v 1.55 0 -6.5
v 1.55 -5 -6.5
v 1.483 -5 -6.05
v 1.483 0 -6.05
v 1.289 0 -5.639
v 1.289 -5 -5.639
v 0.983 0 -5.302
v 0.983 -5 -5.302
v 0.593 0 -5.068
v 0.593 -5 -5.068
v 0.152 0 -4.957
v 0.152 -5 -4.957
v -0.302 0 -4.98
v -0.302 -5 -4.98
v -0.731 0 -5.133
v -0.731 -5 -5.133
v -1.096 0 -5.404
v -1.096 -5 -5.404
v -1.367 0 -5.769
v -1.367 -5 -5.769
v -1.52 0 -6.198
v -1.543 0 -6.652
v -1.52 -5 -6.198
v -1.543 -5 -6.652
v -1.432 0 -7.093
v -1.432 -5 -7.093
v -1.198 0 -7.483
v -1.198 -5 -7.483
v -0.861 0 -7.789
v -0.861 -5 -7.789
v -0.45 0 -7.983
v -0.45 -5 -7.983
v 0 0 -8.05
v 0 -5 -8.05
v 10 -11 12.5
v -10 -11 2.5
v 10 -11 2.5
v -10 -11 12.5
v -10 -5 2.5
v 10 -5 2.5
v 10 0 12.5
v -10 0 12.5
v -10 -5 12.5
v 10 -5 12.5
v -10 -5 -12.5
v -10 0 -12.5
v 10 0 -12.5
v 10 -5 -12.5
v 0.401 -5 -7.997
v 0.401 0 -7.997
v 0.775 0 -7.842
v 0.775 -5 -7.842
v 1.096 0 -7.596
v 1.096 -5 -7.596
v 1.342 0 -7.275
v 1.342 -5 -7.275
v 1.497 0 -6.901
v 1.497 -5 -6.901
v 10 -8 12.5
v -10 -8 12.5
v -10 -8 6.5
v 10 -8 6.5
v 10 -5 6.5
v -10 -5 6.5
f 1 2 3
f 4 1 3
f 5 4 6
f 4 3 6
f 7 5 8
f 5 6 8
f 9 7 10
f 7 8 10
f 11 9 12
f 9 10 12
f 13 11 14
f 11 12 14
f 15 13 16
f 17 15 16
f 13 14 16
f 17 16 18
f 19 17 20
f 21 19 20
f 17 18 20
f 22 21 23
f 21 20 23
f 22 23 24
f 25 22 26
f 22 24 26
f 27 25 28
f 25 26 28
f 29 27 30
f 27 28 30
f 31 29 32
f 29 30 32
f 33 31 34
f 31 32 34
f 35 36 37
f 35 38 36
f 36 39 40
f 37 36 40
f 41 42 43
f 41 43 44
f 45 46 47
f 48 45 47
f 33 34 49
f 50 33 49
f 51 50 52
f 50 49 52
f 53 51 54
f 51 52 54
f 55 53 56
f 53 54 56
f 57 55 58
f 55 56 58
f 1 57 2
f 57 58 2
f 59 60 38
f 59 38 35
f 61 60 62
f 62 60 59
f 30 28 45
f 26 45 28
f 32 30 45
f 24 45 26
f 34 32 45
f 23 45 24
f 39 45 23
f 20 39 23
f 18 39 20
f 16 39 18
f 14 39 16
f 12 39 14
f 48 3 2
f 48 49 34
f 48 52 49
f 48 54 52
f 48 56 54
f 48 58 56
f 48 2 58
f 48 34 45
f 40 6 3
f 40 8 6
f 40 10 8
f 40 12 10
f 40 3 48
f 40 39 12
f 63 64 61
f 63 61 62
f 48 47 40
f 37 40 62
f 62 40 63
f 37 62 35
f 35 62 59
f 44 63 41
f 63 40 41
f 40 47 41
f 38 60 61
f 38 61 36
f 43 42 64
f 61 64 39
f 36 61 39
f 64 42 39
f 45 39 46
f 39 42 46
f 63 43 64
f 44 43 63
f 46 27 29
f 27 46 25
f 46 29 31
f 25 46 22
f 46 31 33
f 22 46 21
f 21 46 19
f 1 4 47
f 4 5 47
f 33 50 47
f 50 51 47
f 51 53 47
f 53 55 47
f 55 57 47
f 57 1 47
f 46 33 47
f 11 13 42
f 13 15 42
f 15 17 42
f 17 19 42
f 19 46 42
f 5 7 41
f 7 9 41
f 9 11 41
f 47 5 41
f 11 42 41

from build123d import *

# Parameters (mm, degrees)
F0_W     = 20
F0_H     = 25
F1_DEPTH = 5
F2_W     = 20
F2_H     = 4
F3_DEPTH = 3
F4_W     = 20
F4_H     = 4
F4_H_2   = 6
F5_DEPTH = 3
F7_DEPTH = 25


with BuildPart() as f1:
    # F0 (on Front) → F1 (new body)
    with BuildSketch(Plane.XZ):
        Rectangle(F0_W, F0_H)
    extrude(amount=F1_DEPTH)

    # F2 (on face) → F3 (join)
    with BuildSketch(Plane.XZ.offset(5)):
        with Locations((0, 4.5)):
            Rectangle(F2_W, F2_H)
    extrude(amount=F3_DEPTH)

    # F4 (on face) → F5 (join)
    with BuildSketch(Plane.XZ.offset(8)):
        with Locations((0, 4.5)):
            Rectangle(F4_W, F4_H)
        with Locations((0, 9.5)):
            Rectangle(F4_W, F4_H_2)
    extrude(amount=F5_DEPTH)

    # F6 (on face) → F7 (cut)
    with BuildSketch(Plane.XZ.offset(5)):
        with BuildLine():
            ThreePointArc((1.55, -6.5), (-1.096016, -5.403984), (0, -8.05))
            ThreePointArc((0, -8.05), (1.096016, -7.596016), (1.55, -6.5))
        make_face()
    extrude(amount=-F7_DEPTH, mode=Mode.SUBTRACT)


solid = f1.part
